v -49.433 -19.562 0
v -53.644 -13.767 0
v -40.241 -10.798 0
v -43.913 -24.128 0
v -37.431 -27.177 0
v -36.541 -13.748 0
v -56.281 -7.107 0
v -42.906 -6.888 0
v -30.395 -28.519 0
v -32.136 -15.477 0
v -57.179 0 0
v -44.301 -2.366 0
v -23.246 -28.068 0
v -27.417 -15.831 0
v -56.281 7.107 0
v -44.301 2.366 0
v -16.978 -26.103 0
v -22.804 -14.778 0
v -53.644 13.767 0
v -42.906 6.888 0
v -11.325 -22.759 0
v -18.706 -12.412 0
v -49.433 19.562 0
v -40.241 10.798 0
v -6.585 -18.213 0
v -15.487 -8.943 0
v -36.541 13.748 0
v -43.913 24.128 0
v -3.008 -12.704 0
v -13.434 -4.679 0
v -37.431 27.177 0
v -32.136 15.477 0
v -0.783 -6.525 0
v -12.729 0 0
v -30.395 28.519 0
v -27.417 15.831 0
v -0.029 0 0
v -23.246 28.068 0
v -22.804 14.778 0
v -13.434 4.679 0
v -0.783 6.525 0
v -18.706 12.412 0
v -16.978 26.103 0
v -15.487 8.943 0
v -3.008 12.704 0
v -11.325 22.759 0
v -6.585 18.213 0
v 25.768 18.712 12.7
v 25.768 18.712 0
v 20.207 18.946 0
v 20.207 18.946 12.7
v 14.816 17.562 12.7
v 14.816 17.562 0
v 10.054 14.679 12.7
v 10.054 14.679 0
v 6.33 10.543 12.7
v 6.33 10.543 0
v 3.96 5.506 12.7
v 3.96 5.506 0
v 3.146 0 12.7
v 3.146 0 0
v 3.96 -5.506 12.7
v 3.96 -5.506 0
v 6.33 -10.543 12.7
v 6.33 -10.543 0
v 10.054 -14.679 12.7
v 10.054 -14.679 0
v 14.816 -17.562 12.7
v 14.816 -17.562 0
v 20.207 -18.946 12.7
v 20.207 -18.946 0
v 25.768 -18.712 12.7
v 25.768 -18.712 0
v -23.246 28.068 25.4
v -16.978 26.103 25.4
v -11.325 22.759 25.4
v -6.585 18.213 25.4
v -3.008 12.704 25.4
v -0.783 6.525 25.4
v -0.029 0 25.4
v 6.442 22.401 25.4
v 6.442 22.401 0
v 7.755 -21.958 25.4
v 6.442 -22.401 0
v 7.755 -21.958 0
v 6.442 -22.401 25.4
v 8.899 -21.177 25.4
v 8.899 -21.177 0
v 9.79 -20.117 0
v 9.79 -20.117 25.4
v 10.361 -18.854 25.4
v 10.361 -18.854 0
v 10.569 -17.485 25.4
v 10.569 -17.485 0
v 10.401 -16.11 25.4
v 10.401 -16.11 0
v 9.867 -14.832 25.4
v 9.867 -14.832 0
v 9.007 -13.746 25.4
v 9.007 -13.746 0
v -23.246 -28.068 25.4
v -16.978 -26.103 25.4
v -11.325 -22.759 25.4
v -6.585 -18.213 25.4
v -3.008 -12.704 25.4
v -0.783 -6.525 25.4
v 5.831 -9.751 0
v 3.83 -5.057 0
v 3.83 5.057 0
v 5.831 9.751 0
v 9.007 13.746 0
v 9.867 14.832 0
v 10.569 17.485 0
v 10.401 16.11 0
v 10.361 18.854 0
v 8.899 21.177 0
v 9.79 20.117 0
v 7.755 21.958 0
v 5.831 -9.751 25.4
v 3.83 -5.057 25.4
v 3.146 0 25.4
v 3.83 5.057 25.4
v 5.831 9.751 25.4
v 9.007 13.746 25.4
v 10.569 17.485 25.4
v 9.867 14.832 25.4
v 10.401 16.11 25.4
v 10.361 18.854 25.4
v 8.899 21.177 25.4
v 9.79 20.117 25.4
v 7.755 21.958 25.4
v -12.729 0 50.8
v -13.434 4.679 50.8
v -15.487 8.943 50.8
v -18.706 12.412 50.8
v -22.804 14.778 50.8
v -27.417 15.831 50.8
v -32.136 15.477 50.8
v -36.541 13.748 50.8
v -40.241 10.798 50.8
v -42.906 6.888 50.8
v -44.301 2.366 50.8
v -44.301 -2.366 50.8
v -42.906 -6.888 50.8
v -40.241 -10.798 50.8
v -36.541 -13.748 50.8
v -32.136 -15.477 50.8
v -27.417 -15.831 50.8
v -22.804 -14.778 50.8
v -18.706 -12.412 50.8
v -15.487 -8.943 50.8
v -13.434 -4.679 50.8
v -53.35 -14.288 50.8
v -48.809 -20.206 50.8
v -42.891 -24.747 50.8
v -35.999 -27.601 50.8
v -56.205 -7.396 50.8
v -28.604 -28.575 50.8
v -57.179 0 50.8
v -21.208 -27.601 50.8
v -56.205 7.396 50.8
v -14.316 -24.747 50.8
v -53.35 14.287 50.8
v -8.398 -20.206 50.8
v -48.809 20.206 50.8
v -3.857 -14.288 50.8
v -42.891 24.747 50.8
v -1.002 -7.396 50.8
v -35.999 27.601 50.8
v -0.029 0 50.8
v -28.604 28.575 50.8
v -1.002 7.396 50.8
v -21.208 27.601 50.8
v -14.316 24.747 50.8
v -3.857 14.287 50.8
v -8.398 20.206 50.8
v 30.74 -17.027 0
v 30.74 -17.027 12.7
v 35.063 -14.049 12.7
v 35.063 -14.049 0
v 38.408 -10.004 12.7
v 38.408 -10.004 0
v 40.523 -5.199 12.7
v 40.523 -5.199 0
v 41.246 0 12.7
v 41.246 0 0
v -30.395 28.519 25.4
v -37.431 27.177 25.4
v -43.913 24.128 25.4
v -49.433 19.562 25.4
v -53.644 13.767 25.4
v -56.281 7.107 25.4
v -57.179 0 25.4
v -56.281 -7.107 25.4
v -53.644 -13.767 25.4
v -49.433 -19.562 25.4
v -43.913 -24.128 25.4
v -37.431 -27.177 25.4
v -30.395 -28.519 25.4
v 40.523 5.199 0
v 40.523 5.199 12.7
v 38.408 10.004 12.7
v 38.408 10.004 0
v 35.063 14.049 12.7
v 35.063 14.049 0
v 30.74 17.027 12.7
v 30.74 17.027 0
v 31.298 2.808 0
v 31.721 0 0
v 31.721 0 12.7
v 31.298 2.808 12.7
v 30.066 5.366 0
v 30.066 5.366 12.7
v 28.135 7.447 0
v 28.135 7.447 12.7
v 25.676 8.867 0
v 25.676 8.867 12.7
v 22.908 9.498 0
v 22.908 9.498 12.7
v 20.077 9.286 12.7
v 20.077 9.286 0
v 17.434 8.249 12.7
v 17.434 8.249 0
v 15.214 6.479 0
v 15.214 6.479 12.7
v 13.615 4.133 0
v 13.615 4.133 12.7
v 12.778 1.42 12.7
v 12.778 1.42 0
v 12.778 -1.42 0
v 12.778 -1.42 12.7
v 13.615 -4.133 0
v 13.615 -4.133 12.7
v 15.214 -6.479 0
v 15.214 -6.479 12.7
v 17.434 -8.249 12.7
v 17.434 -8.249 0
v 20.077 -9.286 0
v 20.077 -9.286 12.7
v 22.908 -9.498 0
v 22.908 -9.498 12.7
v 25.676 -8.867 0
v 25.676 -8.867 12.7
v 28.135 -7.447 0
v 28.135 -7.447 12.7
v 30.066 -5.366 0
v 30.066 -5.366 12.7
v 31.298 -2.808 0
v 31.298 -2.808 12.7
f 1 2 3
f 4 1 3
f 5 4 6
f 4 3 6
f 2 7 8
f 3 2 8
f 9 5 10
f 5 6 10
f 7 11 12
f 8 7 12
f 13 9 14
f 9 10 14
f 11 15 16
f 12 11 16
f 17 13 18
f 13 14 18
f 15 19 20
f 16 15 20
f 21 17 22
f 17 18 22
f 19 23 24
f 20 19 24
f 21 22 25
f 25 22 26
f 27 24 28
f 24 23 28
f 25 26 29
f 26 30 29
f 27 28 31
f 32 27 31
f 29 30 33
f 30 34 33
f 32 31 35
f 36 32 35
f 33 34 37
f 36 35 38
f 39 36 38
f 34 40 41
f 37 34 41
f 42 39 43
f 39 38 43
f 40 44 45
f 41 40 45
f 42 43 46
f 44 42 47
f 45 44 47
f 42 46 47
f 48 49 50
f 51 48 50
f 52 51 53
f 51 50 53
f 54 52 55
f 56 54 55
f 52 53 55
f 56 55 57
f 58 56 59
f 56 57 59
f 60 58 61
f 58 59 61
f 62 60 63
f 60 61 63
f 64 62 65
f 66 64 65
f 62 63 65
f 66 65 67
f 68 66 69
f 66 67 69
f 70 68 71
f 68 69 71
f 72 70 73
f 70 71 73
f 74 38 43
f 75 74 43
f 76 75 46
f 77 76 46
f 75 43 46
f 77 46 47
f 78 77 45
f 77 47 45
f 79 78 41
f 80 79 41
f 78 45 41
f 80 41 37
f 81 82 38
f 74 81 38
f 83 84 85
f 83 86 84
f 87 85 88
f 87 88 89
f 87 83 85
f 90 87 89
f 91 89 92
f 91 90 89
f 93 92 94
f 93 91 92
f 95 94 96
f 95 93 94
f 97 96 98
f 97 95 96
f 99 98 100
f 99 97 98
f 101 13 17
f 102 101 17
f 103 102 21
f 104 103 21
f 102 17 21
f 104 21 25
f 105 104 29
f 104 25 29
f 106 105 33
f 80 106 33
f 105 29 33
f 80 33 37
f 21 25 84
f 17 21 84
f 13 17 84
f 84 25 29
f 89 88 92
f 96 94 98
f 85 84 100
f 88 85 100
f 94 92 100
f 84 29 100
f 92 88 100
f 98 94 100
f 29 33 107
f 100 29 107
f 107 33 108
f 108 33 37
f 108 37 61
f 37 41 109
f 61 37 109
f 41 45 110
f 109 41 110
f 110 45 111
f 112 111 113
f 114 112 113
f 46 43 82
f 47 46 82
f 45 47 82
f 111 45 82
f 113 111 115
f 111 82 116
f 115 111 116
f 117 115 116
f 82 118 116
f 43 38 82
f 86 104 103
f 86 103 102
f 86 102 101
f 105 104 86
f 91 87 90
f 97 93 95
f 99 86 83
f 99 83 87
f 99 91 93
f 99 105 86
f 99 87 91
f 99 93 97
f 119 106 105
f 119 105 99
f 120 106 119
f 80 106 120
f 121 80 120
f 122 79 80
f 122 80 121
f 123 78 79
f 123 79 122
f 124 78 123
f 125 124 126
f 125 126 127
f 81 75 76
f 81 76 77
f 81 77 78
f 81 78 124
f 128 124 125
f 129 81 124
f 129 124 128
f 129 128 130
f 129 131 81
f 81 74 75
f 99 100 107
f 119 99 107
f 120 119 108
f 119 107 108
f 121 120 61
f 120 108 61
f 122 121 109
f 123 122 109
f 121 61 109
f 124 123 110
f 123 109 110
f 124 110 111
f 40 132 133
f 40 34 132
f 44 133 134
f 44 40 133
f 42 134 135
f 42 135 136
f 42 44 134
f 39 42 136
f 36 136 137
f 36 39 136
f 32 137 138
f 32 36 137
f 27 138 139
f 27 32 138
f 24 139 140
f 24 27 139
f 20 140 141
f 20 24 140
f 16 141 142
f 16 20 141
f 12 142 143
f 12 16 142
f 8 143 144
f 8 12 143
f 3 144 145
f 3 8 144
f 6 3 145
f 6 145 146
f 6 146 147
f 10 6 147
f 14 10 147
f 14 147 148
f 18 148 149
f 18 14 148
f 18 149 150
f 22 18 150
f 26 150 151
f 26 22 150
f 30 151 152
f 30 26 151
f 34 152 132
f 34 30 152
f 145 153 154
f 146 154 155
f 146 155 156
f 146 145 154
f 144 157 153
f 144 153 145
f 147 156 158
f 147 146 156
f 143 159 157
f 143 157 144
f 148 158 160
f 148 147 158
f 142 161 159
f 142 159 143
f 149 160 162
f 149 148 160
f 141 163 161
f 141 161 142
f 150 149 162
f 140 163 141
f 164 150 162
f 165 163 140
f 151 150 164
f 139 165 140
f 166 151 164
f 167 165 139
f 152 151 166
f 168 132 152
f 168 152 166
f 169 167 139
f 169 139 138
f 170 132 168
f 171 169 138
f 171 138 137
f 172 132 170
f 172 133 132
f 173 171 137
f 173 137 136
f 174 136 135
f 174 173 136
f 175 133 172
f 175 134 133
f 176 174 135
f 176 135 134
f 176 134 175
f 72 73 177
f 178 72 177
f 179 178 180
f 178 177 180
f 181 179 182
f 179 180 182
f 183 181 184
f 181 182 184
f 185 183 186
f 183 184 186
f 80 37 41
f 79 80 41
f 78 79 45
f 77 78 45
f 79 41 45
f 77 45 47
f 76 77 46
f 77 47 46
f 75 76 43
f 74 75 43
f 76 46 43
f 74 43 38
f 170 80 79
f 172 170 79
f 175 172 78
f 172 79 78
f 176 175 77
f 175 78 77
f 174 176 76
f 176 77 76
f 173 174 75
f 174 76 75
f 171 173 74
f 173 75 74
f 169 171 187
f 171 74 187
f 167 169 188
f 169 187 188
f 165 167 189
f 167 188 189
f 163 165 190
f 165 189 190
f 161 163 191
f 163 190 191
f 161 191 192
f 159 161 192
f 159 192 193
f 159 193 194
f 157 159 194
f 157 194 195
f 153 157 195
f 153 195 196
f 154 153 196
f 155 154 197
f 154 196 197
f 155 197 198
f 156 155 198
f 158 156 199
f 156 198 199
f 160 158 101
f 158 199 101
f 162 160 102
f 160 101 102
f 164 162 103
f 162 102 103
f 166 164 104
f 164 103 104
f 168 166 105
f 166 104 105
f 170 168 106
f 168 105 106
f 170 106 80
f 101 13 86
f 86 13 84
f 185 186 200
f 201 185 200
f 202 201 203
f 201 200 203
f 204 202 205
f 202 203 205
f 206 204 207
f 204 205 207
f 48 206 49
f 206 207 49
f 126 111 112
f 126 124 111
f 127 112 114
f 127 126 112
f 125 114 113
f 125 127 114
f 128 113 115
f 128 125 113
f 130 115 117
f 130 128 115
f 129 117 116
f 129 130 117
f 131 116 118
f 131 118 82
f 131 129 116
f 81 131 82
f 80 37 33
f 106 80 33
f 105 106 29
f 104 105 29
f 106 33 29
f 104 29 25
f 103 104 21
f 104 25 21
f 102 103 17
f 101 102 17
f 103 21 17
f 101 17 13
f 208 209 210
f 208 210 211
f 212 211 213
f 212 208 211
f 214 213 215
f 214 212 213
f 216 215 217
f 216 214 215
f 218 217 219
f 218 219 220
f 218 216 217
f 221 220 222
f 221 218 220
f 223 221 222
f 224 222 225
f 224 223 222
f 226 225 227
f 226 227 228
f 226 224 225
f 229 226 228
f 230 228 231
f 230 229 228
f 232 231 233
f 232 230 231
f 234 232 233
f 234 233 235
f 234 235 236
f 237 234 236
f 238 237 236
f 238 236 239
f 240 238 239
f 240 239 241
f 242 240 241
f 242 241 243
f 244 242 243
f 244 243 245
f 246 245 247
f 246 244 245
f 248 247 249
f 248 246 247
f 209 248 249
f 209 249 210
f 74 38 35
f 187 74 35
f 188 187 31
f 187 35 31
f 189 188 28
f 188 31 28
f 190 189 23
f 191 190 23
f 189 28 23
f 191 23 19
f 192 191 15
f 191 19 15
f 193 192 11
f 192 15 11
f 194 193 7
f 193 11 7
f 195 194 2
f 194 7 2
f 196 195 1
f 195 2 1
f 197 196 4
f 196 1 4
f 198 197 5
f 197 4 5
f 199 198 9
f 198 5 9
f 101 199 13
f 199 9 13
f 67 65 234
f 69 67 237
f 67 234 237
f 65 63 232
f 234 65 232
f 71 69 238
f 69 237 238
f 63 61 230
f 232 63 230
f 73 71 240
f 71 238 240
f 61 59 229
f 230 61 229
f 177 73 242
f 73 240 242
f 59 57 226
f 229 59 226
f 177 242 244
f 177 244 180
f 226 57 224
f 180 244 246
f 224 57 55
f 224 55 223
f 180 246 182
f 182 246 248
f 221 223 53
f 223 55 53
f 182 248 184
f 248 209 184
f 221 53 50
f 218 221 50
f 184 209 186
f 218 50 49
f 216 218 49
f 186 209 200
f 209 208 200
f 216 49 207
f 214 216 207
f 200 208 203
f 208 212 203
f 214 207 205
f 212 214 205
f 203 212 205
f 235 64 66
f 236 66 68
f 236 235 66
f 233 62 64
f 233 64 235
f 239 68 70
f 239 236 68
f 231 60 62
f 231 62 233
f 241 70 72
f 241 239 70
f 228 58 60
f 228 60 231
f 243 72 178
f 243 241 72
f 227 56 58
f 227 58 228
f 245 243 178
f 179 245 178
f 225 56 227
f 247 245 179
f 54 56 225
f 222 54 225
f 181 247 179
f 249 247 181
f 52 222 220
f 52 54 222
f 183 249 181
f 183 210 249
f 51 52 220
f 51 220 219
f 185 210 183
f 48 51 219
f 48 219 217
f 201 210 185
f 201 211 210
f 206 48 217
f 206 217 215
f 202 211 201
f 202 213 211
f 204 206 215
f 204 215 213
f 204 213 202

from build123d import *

# Parameters (mm, degrees)
F0_R        = 15.875
F1_DEPTH    = 25.4
F1_FACE_R   = 28.575
F1_FACE_R_2 = 15.875
F2_DEPTH    = 25.4
F0_R_2      = 9.525
F3_DEPTH    = 12.7
F4_DEPTH    = 25.4
F5_R        = 5.08


with BuildPart() as f1:
    # F0 (on Top) → F1 (new body)
    with BuildSketch(Plane.XY):
        with BuildLine():
            ThreePointArc((-23.2457928882, -28.0682110263), (-6.5850891214, -18.2130603251), (-0.0286053882, 0))
            ThreePointArc((-0.0286053882, 0), (-6.5850891214, 18.2130603251), (-23.2457928882, 28.0682110263))
            ThreePointArc((-23.2457928882, 28.0682110263), (-57.1786053882, 0), (-23.2457928882, -28.0682110263))
        make_face()
        with Locations((-28.6036053882, 0)):
            Circle(F0_R, mode=Mode.SUBTRACT)
    extrude(amount=F1_DEPTH)

    # F1_face (on face) → F2 (join)
    with BuildSketch(Plane(origin=(-28.6036053882, 0, 25.4), x_dir=(1, 0, 0), z_dir=(0, 0, 1))):
        Circle(F1_FACE_R)
        Circle(F1_FACE_R_2, mode=Mode.SUBTRACT)
    extrude(amount=F2_DEPTH)


with BuildPart() as f3:
    # F0 (on Top) → F3 (new body)
    with BuildSketch(Plane.XY):
        with BuildLine():
            ThreePointArc((41.2463946118, 0), (36.8754054564, 12.1420402167), (25.7682696118, 18.7121406842))
            ThreePointArc((25.7682696118, 18.7121406842), (3.1463946118, 0), (25.7682696118, -18.7121406842))
            ThreePointArc((25.7682696118, -18.7121406842), (36.8754054564, -12.1420402167), (41.2463946118, 0))
        make_face()
        with Locations((22.1963946118, 0)):
            Circle(F0_R_2, mode=Mode.SUBTRACT)
    extrude(amount=F3_DEPTH)


with BuildPart() as f4:
    # F0 (on Top) → F4 (new body)
    with BuildSketch(Plane.XY):
        with BuildLine():
            ThreePointArc((-23.2457928882, 28.0682110263), (-6.5850891214, 18.2130603251), (-0.0286053882, 0))
            ThreePointArc((-0.0286053882, 0), (-6.5850891214, -18.2130603251), (-23.2457928882, -28.0682110263))
            Line((-23.2457928882, -28.0682110263), (25.7682696118, -18.7121406842))
            ThreePointArc((25.7682696118, -18.7121406842), (3.1463946118, 0), (25.7682696118, 18.7121406842))
            Line((25.7682696118, 18.7121406842), (-23.2457928882, 28.0682110263))
        make_face()
    extrude(amount=F4_DEPTH)

    # F5
    f5_edges = [f4.edges().sort_by_distance(p)[0] for p in [
        (25.76827, -18.712141, 12.7),
        (25.76827, 18.712141, 12.7),
    ]]
    fillet(f5_edges, radius=F5_R)


solid = Compound([f1.part, f3.part, f4.part])
